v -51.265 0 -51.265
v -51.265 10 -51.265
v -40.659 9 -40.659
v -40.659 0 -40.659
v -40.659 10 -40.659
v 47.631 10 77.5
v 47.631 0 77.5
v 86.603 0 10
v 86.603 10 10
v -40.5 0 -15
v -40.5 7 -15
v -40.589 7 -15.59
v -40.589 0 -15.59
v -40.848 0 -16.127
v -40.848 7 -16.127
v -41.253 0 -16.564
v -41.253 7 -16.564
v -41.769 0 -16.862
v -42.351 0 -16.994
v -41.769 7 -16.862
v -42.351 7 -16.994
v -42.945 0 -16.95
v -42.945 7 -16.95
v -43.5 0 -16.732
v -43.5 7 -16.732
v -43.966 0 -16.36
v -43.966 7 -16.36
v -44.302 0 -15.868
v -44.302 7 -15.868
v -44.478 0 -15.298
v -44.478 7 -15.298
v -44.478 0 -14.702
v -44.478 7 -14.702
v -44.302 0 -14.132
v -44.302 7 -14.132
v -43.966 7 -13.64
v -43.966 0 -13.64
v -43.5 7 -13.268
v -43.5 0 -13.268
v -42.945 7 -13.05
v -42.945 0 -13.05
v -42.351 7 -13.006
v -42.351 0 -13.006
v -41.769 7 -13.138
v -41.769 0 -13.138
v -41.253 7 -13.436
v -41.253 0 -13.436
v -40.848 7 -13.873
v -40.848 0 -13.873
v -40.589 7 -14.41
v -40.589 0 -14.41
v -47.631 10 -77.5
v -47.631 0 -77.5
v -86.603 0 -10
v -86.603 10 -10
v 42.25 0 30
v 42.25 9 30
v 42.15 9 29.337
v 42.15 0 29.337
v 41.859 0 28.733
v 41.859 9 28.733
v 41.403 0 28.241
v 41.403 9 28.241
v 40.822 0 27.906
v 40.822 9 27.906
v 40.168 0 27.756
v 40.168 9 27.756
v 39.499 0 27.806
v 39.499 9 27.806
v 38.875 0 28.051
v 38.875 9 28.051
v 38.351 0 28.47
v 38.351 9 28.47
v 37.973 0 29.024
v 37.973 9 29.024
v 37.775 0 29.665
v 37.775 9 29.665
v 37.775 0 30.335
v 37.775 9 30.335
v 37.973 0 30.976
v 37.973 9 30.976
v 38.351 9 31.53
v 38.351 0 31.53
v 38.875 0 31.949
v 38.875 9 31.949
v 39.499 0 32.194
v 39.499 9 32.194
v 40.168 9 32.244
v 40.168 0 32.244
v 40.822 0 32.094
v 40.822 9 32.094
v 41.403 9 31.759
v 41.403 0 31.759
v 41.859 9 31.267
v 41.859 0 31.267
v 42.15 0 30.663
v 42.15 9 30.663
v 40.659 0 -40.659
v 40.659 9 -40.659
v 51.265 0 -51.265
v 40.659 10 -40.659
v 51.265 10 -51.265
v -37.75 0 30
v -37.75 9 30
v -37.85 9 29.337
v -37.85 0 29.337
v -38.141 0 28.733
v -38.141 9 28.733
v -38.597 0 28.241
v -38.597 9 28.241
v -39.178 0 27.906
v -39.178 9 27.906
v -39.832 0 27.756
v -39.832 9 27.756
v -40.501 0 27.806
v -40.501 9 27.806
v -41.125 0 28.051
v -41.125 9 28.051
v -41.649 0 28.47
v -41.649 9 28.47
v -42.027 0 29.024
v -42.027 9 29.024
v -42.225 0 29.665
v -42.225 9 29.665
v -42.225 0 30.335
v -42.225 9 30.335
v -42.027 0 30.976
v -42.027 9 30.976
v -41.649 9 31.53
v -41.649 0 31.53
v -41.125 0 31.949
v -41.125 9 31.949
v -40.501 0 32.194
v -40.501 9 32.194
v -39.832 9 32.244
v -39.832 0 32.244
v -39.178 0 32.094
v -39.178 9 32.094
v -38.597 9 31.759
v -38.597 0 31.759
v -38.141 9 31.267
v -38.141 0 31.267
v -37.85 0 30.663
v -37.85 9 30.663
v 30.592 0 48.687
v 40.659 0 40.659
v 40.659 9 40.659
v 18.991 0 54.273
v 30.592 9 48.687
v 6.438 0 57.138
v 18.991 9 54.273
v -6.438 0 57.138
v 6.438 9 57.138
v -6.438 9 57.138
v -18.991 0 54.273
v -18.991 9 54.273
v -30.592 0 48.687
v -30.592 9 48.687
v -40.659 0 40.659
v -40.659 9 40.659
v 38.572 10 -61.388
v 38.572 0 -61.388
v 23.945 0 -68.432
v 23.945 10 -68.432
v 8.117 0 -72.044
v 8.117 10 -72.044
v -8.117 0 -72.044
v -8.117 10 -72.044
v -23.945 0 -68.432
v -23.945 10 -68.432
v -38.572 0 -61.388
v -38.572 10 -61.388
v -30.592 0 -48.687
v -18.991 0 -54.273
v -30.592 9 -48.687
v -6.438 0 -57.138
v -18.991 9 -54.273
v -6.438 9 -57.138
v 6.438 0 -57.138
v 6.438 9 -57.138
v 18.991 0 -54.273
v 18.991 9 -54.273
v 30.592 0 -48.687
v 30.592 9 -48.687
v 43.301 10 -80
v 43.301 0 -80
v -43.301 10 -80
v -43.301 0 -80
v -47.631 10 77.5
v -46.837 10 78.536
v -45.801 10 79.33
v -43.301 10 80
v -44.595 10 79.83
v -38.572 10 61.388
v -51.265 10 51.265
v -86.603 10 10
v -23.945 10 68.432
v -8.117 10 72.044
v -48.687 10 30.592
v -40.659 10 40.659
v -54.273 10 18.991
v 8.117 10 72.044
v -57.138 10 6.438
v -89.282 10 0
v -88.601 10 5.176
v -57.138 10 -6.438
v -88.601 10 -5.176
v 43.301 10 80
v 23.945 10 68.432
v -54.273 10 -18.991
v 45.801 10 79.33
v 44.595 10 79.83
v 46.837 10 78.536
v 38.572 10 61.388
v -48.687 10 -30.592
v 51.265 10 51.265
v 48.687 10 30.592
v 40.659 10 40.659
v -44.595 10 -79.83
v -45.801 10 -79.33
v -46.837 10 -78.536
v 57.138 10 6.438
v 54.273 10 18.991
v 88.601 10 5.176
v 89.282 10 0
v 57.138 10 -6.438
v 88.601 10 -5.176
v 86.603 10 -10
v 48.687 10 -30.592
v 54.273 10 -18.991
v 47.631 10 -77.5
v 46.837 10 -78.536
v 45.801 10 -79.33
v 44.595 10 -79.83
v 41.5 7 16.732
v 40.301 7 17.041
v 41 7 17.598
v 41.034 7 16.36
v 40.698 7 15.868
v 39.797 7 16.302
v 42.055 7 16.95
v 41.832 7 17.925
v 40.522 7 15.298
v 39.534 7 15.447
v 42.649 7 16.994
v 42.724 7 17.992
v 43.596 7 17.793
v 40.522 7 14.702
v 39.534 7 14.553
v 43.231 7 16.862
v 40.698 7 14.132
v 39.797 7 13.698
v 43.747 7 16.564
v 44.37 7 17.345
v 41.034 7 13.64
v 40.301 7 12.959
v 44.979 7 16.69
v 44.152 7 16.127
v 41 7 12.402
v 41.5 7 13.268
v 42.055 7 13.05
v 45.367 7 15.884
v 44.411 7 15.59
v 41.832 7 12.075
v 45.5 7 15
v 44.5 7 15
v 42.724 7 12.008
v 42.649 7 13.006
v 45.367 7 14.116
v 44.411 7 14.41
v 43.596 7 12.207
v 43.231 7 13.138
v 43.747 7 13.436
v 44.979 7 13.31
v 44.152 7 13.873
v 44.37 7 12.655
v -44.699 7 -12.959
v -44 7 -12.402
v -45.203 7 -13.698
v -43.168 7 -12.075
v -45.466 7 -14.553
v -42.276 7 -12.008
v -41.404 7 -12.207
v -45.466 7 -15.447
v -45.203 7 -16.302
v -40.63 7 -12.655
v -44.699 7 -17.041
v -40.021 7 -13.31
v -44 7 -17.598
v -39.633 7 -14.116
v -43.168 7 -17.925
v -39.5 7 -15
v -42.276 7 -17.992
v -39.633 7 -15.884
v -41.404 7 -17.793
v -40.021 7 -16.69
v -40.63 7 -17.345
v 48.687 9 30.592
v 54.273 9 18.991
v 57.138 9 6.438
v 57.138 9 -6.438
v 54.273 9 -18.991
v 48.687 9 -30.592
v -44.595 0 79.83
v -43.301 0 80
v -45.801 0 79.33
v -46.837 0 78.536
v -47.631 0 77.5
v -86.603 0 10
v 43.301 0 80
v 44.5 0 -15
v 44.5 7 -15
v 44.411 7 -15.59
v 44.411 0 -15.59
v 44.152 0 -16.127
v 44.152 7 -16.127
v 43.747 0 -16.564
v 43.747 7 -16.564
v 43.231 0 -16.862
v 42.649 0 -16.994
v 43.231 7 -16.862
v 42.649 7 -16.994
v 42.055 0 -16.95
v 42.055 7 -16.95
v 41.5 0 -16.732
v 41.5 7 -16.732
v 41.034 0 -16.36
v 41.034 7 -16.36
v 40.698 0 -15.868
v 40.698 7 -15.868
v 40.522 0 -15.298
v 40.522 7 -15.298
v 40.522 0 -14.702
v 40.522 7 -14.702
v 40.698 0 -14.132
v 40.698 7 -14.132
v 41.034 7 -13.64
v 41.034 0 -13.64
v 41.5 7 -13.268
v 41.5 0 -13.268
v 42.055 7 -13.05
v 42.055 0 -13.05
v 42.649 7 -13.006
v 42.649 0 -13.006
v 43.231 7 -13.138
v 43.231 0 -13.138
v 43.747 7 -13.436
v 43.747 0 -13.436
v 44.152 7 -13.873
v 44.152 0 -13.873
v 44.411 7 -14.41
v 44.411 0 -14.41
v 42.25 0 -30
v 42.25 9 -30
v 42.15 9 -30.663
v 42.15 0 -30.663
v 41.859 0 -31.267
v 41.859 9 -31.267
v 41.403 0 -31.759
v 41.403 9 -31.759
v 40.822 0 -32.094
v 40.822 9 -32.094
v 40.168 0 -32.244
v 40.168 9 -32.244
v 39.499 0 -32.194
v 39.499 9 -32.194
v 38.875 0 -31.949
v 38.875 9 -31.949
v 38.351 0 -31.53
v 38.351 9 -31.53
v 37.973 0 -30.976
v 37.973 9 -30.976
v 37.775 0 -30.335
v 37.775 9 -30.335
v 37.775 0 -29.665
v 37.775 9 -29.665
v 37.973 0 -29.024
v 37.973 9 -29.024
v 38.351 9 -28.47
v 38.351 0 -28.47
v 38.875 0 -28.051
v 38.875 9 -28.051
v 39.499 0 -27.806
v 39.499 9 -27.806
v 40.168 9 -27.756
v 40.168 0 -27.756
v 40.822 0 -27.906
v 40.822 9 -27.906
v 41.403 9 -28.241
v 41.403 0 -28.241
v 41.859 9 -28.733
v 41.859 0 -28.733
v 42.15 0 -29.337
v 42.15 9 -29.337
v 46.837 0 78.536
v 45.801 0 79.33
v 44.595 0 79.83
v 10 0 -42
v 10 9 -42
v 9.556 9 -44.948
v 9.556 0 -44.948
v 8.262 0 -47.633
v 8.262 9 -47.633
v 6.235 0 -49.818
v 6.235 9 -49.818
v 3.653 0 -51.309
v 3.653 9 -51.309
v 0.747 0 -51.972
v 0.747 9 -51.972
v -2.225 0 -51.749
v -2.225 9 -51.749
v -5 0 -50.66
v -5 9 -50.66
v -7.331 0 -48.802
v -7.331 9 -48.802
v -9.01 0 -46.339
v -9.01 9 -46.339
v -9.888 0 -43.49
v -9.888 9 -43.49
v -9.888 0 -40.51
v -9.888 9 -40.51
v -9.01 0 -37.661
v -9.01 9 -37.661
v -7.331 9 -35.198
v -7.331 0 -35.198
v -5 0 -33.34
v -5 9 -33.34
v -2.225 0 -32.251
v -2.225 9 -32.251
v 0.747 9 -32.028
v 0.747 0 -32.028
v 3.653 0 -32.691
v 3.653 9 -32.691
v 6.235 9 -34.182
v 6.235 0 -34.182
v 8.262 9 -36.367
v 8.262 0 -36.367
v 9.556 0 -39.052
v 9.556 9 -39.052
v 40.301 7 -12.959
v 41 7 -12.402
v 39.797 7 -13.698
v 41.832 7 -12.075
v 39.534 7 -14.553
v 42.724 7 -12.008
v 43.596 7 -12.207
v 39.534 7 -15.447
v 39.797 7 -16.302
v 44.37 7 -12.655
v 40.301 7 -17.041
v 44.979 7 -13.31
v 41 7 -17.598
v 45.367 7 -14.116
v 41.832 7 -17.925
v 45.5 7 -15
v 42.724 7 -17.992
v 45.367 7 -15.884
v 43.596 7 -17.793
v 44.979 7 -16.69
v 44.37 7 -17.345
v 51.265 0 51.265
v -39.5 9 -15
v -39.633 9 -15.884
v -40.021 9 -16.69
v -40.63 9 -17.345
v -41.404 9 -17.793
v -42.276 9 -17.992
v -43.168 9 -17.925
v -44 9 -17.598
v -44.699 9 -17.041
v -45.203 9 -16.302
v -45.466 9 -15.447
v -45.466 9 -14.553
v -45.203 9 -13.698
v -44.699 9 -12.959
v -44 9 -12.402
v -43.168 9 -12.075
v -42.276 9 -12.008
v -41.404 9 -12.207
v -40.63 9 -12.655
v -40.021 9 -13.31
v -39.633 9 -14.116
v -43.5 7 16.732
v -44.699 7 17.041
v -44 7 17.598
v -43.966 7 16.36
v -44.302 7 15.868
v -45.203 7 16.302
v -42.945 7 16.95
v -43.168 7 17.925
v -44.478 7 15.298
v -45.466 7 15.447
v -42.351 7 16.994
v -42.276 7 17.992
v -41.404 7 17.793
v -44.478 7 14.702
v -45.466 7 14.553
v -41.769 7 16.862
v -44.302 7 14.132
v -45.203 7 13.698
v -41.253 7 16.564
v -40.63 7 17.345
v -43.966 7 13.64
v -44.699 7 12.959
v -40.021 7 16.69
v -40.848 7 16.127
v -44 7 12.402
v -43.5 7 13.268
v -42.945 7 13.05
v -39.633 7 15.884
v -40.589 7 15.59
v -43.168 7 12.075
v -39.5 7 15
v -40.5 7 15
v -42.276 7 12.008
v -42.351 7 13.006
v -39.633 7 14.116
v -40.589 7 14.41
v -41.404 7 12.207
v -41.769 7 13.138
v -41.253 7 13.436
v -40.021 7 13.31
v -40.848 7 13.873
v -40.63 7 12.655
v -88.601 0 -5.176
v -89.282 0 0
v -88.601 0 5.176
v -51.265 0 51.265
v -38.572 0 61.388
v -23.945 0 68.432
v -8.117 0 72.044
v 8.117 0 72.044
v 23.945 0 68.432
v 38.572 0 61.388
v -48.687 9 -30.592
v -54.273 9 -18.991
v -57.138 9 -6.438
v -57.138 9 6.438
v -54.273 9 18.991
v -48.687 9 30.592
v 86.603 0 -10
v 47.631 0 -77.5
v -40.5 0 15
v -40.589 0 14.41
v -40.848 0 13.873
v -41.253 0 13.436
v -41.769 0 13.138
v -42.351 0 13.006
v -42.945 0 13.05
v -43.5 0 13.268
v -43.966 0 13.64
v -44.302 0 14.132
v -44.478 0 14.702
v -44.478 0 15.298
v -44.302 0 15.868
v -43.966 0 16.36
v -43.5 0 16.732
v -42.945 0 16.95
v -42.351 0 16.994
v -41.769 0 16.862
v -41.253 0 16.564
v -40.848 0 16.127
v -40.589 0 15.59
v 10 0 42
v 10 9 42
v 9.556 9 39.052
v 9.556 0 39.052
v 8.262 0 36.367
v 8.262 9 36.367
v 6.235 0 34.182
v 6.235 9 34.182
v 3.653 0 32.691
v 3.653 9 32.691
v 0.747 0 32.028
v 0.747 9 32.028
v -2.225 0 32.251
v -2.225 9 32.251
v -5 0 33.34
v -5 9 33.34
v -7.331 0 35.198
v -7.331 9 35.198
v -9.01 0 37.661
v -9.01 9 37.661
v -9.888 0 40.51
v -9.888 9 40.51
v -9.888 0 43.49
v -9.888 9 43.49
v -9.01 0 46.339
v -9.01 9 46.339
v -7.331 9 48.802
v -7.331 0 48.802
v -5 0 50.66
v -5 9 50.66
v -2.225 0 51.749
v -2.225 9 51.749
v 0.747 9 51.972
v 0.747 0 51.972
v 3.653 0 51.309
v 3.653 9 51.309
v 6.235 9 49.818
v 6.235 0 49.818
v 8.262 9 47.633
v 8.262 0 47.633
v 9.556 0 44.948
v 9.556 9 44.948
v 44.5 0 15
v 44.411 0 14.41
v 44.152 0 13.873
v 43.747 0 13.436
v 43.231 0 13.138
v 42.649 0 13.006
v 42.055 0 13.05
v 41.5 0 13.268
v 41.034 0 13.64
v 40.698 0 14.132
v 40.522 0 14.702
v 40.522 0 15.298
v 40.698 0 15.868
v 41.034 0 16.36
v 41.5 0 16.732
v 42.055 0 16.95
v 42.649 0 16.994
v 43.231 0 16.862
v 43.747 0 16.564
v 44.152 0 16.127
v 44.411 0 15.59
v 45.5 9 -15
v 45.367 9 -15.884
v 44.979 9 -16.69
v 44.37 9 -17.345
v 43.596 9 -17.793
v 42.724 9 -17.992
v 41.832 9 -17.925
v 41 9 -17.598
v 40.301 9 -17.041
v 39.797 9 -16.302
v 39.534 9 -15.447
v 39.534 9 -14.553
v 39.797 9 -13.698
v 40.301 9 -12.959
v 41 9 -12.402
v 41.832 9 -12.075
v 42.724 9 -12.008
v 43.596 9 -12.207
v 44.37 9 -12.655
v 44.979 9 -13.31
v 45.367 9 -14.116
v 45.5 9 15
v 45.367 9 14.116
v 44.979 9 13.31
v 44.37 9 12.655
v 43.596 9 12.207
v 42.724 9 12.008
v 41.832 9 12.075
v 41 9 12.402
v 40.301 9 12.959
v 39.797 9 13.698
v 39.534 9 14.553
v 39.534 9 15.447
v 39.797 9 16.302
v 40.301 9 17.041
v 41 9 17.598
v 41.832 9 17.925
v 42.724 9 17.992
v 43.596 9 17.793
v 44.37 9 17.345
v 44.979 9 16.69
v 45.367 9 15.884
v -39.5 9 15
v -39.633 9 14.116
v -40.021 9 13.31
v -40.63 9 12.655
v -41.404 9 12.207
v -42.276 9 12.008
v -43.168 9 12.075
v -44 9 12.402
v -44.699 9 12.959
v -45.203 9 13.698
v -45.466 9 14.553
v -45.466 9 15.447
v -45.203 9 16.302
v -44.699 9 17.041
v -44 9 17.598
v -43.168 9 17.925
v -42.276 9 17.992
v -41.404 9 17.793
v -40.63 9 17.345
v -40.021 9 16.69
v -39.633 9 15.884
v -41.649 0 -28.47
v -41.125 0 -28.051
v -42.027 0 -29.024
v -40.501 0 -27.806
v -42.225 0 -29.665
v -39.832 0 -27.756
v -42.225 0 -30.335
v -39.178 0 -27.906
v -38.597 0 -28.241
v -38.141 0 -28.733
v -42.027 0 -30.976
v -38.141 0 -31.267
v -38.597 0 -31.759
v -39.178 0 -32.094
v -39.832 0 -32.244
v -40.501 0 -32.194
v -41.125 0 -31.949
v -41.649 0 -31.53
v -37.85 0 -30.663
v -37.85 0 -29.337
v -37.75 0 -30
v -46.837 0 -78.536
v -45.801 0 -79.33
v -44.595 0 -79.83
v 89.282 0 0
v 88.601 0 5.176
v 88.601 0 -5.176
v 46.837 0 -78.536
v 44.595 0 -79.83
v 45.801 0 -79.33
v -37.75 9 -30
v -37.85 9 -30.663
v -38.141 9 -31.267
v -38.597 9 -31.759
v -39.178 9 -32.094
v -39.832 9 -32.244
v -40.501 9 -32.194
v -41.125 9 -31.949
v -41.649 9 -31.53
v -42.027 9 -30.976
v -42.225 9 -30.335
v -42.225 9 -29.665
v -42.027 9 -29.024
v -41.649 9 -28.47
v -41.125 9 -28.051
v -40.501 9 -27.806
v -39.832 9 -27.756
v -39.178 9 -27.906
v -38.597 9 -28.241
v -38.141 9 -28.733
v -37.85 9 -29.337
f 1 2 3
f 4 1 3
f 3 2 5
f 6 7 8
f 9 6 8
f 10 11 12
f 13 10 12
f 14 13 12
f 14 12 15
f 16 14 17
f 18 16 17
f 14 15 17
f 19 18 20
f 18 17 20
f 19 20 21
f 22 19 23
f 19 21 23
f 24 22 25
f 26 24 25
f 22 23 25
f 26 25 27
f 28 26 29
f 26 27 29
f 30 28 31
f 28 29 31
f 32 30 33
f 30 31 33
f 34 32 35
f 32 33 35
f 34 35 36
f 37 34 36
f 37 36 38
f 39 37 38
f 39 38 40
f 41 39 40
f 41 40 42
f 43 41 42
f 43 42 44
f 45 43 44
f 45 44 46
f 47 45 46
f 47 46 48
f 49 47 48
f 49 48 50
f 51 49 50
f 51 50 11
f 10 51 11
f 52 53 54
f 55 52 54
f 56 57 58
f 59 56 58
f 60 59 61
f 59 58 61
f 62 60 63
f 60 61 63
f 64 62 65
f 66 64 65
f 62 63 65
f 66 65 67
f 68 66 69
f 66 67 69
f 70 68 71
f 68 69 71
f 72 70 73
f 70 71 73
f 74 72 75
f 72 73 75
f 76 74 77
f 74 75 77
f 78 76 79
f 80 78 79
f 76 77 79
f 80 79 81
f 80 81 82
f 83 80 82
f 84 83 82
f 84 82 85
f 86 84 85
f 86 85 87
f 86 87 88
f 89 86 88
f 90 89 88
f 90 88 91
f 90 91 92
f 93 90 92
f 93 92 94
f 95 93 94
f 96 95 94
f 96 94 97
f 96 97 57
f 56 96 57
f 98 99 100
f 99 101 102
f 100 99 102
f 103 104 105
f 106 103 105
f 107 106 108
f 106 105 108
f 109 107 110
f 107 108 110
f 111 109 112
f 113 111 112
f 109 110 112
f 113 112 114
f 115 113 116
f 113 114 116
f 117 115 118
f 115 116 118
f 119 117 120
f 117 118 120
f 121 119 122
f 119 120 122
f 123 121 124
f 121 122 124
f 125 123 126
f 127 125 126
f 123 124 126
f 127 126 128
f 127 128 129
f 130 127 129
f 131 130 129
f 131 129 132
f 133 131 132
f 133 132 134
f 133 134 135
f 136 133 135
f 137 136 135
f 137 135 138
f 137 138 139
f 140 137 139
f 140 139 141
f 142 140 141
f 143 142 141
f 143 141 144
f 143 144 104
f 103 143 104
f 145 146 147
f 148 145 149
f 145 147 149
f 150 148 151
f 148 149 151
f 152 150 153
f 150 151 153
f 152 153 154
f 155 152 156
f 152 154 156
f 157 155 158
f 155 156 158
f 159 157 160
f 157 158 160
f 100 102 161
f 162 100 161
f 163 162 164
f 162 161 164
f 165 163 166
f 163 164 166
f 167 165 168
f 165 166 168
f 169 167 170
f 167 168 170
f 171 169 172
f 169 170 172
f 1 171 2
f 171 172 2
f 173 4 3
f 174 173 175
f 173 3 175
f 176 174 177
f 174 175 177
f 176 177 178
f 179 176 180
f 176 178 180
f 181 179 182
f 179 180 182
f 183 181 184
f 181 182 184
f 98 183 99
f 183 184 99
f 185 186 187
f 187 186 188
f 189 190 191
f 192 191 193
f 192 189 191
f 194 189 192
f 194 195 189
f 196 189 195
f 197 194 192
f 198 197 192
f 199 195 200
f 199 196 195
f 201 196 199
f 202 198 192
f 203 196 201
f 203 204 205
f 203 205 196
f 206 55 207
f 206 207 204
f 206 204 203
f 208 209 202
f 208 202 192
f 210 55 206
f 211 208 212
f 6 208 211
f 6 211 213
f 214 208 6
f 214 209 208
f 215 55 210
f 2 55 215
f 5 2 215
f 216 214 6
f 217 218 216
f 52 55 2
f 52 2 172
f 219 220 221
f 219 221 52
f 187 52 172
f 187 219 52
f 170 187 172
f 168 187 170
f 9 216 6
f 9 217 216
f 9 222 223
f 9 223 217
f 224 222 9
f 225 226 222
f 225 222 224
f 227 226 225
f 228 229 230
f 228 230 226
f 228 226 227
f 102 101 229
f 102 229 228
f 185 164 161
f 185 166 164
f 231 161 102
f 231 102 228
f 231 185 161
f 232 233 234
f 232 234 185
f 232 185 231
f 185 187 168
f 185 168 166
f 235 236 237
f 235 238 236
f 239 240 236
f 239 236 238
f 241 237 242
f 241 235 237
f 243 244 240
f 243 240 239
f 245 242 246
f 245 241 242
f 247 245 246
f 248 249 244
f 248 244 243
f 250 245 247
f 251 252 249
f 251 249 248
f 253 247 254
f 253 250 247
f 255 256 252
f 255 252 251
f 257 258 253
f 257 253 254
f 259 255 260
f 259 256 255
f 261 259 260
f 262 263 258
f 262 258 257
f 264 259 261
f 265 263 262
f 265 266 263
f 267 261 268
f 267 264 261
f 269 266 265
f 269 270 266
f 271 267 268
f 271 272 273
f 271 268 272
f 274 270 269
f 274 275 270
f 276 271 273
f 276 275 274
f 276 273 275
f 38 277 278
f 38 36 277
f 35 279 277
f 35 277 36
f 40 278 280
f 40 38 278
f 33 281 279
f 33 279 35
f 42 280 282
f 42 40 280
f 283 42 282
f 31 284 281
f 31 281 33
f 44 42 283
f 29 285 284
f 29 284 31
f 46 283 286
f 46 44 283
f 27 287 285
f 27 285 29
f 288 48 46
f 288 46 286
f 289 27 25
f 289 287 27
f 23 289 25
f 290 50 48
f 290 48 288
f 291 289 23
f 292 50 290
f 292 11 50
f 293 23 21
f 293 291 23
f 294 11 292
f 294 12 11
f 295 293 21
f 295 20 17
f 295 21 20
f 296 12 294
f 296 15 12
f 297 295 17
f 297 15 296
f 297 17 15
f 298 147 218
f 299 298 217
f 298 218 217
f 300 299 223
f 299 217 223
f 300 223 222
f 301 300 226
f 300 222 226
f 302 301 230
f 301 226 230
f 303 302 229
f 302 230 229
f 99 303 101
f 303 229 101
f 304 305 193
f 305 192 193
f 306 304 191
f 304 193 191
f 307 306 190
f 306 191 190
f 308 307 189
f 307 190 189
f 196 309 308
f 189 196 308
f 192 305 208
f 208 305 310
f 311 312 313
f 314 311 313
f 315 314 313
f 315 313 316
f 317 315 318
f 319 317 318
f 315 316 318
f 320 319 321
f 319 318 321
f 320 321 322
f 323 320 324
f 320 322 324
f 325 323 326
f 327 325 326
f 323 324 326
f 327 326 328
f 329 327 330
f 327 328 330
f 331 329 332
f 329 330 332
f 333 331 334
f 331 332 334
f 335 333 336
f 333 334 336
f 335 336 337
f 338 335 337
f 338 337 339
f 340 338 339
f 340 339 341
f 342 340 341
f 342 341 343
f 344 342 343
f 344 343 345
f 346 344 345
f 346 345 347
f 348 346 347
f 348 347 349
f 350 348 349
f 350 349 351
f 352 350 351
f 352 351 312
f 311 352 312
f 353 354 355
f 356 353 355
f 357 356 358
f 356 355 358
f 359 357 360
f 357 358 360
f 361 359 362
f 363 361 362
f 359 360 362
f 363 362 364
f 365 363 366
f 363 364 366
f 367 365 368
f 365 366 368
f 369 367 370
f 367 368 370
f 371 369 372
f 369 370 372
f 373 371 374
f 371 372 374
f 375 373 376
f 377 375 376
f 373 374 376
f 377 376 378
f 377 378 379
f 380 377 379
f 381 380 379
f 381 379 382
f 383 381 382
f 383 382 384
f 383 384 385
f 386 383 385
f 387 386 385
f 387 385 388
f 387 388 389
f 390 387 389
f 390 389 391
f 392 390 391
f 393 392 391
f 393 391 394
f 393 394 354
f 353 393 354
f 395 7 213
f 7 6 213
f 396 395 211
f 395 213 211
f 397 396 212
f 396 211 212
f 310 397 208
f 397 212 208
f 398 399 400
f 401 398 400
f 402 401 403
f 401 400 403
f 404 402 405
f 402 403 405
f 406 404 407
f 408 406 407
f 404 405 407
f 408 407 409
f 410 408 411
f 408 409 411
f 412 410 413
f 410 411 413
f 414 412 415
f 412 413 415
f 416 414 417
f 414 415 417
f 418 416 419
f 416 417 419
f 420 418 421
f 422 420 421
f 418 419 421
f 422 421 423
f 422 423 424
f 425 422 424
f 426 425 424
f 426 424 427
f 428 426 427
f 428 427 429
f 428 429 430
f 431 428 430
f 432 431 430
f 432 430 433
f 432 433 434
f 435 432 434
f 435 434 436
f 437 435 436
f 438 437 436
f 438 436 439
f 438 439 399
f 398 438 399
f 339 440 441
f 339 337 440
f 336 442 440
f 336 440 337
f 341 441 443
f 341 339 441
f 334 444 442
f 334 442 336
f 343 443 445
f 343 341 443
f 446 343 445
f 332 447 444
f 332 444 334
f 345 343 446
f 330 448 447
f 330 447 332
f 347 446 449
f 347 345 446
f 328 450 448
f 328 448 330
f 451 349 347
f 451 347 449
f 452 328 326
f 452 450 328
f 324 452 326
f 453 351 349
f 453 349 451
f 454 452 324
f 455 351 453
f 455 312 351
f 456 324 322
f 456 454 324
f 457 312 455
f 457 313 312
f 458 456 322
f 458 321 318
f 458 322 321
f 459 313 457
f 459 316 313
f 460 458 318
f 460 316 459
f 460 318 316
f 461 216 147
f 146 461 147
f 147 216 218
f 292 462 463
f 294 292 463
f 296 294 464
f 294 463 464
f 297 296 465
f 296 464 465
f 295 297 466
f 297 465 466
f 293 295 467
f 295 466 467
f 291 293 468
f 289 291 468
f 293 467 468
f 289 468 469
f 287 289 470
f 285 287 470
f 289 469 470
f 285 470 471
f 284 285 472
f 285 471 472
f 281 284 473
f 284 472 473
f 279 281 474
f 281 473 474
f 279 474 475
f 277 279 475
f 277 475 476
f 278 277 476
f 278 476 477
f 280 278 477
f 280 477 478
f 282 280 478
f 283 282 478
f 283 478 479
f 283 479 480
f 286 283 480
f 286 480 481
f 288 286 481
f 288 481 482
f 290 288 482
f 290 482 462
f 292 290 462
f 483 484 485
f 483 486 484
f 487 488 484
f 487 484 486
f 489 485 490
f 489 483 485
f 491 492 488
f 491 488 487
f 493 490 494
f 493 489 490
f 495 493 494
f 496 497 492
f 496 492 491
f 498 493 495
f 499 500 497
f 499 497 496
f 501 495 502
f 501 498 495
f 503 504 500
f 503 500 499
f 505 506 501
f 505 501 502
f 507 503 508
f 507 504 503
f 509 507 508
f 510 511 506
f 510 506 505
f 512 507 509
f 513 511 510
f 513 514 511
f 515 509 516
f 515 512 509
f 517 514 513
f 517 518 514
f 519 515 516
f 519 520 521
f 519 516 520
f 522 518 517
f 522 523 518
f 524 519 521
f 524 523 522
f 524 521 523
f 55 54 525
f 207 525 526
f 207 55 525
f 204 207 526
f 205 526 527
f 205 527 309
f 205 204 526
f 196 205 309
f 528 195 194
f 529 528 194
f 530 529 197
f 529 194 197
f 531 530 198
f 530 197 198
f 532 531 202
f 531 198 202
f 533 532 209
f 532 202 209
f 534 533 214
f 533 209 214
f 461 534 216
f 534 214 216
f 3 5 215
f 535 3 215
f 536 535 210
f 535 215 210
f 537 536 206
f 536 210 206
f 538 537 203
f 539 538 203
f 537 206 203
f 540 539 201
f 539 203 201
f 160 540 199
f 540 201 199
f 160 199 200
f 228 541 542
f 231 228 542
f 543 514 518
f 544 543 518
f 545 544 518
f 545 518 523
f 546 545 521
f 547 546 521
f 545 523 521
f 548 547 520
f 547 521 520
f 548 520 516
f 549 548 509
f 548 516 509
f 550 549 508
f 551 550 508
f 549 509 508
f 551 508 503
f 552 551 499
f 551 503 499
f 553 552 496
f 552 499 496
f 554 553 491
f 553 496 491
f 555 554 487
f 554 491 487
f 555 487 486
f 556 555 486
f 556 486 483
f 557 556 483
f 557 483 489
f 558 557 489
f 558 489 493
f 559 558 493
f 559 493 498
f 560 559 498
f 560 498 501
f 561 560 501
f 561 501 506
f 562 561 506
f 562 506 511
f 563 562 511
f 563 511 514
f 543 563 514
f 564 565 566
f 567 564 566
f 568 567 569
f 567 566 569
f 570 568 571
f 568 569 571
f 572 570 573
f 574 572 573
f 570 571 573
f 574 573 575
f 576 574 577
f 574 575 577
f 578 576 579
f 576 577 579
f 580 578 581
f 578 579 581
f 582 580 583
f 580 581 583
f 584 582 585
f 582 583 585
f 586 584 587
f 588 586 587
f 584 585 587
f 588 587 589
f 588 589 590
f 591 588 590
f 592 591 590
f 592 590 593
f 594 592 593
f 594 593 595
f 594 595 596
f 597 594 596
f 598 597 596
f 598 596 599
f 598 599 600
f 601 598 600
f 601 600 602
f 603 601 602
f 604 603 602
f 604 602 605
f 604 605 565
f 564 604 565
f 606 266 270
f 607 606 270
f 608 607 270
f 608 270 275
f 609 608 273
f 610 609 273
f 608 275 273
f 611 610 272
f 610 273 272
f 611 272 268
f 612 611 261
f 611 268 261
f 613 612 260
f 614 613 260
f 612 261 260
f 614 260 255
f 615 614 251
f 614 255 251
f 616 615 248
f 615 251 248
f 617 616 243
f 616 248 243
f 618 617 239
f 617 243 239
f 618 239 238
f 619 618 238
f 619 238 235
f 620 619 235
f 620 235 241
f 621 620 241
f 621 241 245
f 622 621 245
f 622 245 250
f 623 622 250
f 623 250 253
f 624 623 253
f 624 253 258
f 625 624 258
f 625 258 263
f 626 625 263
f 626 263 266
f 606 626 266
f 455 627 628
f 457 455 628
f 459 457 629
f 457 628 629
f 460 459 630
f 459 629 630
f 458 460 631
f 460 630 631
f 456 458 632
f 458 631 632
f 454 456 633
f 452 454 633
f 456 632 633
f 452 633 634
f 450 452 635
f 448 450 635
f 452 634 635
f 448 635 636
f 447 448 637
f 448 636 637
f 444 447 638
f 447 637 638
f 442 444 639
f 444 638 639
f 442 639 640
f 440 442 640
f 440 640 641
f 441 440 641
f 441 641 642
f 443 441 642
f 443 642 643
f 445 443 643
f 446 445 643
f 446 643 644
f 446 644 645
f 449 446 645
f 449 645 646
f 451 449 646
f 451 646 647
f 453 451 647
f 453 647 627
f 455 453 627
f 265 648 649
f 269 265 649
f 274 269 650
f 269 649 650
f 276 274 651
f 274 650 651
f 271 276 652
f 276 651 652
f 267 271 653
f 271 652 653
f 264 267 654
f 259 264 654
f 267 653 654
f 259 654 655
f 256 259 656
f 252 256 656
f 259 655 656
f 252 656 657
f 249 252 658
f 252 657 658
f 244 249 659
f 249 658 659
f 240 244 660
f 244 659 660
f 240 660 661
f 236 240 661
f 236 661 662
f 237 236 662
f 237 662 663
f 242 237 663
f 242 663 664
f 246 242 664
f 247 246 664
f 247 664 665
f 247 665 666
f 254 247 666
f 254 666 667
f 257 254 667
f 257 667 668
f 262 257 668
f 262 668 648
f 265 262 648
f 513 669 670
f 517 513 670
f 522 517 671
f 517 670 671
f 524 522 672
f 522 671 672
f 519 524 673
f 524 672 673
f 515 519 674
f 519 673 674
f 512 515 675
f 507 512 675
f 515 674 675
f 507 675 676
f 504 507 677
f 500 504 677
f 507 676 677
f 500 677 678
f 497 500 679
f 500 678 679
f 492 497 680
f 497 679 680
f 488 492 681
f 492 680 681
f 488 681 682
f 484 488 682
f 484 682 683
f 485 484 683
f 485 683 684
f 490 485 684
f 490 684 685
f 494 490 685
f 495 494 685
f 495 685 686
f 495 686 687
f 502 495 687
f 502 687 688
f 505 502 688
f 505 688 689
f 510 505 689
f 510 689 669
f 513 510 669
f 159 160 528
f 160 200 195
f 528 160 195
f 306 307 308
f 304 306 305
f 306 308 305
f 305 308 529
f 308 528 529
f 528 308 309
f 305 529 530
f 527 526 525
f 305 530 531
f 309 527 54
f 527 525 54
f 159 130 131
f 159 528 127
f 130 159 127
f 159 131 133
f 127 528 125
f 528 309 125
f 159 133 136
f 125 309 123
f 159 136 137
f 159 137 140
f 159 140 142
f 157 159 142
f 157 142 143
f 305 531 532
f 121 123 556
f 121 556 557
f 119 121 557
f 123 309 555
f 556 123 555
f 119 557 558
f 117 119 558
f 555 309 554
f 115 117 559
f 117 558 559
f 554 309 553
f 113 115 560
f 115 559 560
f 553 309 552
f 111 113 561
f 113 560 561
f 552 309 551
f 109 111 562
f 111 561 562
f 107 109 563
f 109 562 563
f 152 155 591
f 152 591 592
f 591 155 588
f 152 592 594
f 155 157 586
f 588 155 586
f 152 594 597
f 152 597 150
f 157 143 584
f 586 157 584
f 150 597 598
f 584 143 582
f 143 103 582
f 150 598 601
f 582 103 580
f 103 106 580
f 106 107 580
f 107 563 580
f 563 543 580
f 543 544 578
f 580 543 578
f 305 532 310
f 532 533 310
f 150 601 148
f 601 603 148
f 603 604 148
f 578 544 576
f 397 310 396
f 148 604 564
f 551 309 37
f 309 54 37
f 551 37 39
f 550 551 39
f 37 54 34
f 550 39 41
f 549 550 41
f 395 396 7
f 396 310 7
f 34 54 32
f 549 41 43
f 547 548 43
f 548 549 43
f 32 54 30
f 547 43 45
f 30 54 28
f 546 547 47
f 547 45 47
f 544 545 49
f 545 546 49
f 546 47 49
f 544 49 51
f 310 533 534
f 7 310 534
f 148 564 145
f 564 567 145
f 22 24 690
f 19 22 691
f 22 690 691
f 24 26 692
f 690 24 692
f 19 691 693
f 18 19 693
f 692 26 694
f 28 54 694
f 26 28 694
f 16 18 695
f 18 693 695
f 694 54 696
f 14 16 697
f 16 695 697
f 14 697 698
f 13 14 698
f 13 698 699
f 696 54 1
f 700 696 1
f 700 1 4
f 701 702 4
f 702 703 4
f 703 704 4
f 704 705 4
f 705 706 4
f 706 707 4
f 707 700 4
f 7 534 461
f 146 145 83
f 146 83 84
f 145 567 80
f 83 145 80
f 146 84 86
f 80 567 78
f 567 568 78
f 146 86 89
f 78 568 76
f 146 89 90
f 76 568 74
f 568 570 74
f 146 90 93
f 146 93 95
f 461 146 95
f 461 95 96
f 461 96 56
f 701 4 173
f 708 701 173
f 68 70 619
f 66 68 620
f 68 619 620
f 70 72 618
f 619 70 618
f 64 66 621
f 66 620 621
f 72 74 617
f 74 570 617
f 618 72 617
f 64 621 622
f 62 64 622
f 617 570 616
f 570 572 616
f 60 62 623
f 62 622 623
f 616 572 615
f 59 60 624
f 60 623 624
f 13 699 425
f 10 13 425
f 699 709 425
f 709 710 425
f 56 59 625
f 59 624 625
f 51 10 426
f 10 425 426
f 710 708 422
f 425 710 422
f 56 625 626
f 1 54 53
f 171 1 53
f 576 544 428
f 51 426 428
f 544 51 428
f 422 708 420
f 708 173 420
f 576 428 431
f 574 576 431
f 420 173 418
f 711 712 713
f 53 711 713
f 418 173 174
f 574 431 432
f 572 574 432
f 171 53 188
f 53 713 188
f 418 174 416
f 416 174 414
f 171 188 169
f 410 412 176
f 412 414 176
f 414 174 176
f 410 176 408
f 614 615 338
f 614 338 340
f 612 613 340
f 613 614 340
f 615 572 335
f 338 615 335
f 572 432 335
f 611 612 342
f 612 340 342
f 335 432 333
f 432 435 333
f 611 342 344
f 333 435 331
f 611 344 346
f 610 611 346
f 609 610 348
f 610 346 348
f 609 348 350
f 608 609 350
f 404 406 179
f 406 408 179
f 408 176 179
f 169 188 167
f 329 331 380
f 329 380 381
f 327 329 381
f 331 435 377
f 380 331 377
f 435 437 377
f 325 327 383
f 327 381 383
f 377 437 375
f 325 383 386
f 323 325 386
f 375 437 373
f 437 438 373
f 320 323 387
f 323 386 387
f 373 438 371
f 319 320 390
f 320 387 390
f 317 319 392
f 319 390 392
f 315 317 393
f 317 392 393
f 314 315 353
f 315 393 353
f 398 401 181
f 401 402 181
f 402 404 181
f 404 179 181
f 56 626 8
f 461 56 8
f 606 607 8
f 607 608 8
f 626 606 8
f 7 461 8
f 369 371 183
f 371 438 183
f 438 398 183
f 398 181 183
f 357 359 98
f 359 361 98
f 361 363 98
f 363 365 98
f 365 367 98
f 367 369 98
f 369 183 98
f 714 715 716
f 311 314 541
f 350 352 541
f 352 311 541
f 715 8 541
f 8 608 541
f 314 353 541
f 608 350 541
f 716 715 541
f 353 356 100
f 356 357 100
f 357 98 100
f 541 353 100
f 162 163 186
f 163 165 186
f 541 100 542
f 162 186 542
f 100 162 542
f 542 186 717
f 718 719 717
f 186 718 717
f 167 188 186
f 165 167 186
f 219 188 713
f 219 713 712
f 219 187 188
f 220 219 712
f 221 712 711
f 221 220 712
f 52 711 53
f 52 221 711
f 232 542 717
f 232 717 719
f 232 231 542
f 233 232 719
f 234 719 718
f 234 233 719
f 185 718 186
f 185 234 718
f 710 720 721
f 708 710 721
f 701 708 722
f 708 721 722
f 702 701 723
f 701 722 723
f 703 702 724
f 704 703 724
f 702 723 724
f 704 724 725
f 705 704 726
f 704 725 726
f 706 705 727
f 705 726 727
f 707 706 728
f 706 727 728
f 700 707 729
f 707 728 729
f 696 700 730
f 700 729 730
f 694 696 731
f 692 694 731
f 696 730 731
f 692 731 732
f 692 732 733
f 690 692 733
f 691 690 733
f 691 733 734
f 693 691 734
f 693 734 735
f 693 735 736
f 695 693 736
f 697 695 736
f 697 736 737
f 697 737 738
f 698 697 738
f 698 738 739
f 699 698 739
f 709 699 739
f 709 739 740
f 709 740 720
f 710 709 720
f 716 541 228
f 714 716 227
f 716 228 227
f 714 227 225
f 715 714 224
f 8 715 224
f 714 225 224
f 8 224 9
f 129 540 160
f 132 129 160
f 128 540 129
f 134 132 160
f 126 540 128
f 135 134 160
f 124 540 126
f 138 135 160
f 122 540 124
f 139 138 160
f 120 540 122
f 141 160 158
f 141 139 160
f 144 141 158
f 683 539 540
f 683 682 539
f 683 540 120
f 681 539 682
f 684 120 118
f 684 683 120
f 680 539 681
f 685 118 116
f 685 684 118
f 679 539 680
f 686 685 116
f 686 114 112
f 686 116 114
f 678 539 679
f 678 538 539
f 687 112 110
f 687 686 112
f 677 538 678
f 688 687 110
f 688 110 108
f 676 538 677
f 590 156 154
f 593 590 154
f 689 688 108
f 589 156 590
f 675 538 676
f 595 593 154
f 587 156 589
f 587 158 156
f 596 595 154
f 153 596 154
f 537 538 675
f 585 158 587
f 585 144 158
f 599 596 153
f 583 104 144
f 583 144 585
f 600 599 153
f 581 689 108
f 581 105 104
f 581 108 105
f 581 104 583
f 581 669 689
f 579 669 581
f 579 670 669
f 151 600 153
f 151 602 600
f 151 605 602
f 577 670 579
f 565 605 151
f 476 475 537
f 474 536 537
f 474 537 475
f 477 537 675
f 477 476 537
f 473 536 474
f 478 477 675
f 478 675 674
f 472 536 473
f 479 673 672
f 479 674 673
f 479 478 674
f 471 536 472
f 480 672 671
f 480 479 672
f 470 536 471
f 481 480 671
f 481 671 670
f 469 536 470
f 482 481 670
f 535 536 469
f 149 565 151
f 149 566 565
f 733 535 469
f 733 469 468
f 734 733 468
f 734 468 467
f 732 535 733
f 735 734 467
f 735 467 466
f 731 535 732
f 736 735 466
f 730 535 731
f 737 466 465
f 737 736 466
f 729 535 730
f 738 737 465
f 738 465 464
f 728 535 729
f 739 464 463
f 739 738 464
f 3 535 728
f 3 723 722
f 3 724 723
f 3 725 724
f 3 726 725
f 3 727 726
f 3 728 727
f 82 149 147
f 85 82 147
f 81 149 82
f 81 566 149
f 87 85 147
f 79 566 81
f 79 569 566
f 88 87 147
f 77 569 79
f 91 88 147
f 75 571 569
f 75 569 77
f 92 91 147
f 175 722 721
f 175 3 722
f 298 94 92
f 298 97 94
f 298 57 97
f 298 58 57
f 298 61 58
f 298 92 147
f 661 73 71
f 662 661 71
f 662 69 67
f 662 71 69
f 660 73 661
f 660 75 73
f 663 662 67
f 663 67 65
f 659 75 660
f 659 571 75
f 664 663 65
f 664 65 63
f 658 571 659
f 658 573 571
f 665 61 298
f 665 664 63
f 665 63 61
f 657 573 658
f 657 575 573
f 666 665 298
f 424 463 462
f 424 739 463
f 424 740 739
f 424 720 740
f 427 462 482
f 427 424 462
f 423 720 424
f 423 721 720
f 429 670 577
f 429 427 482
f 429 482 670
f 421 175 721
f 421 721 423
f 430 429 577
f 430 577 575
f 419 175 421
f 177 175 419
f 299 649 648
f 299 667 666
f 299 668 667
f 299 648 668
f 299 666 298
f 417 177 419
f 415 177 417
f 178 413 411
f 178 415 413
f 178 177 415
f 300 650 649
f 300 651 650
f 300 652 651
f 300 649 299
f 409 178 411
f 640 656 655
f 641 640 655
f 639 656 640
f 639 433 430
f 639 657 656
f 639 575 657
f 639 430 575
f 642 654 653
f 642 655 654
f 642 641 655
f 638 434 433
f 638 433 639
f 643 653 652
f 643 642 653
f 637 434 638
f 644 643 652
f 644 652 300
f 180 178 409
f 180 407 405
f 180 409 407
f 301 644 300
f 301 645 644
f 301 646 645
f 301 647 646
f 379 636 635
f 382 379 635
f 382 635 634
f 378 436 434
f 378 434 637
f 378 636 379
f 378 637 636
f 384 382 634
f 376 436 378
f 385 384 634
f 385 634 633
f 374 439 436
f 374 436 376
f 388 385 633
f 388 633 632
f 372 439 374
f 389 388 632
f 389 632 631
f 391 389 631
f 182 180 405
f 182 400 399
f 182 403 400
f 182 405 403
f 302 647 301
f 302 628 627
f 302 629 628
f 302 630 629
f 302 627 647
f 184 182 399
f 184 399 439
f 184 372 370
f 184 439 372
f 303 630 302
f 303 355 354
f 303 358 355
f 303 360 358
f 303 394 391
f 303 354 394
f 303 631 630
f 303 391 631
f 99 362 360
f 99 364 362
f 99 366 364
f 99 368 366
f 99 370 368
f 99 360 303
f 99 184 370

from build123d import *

# Parameters (mm, degrees)
BOSS_EXTRUDE1_DEPTH = 10
SKETCH8_R           = 2
CUT_EXTRUDE10_DEPTH = 21
SKETCH10_R          = 3
CUT_EXTRUDE11_DEPTH = 3
SKETCH11_R          = 2.25
CUT_EXTRUDE12_DEPTH = 12
SKETCH20_R          = 2.25
SKETCH20_R_2        = 3
CUT_EXTRUDE20_DEPTH = 1
CUT_EXTRUDE23_DEPTH = 153
SKETCH27_R          = 10
CUT_EXTRUDE24_DEPTH = 153
FILLET8_R           = 20
FILLET9_R           = 5


with BuildPart() as part:
    # Sketch1 → Boss-Extrude1 (new body)
    with BuildSketch(Plane(origin=(0, 0, 0), x_dir=(1, 0, 0), z_dir=(0, 1, 0))):
        Polygon((92.37604307, 0), (46.188021535, 80), (-46.188021535, 80), (-92.37604307, 0), (-46.188021535, -80), (46.188021535, -80), align=None)
    extrude(amount=BOSS_EXTRUDE1_DEPTH)

    # Sketch8 → Cut-Extrude10 (cut)
    with BuildSketch(Plane(origin=(0, 10, 0), x_dir=(1, 0, 0), z_dir=(0, 1, 0))):
        with Locations((-42.5, 15)):
            Circle(SKETCH8_R)
        with Locations((-42.5, -15)):
            Circle(SKETCH8_R)
        with Locations((42.5, 15)):
            Circle(SKETCH8_R)
        with Locations((42.5, -15)):
            Circle(SKETCH8_R)
    extrude(amount=-CUT_EXTRUDE10_DEPTH, mode=Mode.SUBTRACT)

    # Sketch10 → Cut-Extrude11 (cut)
    with BuildSketch(Plane(origin=(0, 10, 0), x_dir=(1, 0, 0), z_dir=(0, 1, 0))):
        with Locations((-42.5, 15)):
            Circle(SKETCH10_R)
        with Locations((-42.5, -15)):
            Circle(SKETCH10_R)
        with Locations((42.5, 15)):
            Circle(SKETCH10_R)
        with Locations((42.5, -15)):
            Circle(SKETCH10_R)
    extrude(amount=-CUT_EXTRUDE11_DEPTH, mode=Mode.SUBTRACT)

    # Sketch11 → Cut-Extrude12 (cut)
    with BuildSketch(Plane(origin=(0, 10, 0), x_dir=(1, 0, 0), z_dir=(0, 1, 0))):
        with Locations((-40, 30)):
            Circle(SKETCH11_R)
        with Locations((-40, -30)):
            Circle(SKETCH11_R)
        with Locations((40, -30)):
            Circle(SKETCH11_R)
        with Locations((40, 30)):
            Circle(SKETCH11_R)
    extrude(amount=-CUT_EXTRUDE12_DEPTH, mode=Mode.SUBTRACT)

    # Sketch20 → Cut-Extrude20 (cut)
    with BuildSketch(Plane(origin=(0, 10, 0), x_dir=(1, 0, 0), z_dir=(0, 1, 0))):
        with BuildLine():
            ThreePointArc((40.658639918, 40.658639918), (0, 57.5), (-40.658639918, 40.658639918))
            ThreePointArc((-40.658639918, 40.658639918), (-57.5, 0), (-40.658639918, -40.658639918))
            ThreePointArc((-40.658639918, -40.658639918), (0, -57.5), (40.658639918, -40.658639918))
            ThreePointArc((40.658639918, -40.658639918), (53.123073119, -22.004297361), (57.5, 0))
            ThreePointArc((57.5, 0), (53.123073119, 22.004297361), (40.658639918, 40.658639918))
        make_face()
        with Locations((-40, -30)):
            Circle(SKETCH20_R, mode=Mode.SUBTRACT)
        with Locations((-42.5, -15)):
            Circle(SKETCH20_R_2, mode=Mode.SUBTRACT)
        with Locations((40, -30)):
            Circle(SKETCH20_R, mode=Mode.SUBTRACT)
        with Locations((42.5, -15)):
            Circle(SKETCH20_R_2, mode=Mode.SUBTRACT)
        with Locations((-42.5, 15)):
            Circle(SKETCH20_R_2, mode=Mode.SUBTRACT)
        with Locations((-40, 30)):
            Circle(SKETCH20_R, mode=Mode.SUBTRACT)
        with Locations((42.5, 15)):
            Circle(SKETCH20_R_2, mode=Mode.SUBTRACT)
        with Locations((40, 30)):
            Circle(SKETCH20_R, mode=Mode.SUBTRACT)
    extrude(amount=-CUT_EXTRUDE20_DEPTH, mode=Mode.SUBTRACT)

    # Sketch20<7> → Cut-Extrude23 (cut)
    with BuildSketch(Plane(origin=(0, 10, 0), x_dir=(1, 0, 0), z_dir=(0, 1, 0))):
        with BuildLine():
            Line((-51.265241636, 51.265241636), (-40.658639918, 40.658639918))
            ThreePointArc((-40.658639918, 40.658639918), (0, 57.5), (40.658639918, 40.658639918))
            Line((40.658639918, 40.658639918), (51.265241636, 51.265241636))
            ThreePointArc((51.265241636, 51.265241636), (0, 72.5), (-51.265241636, 51.265241636))
        make_face()
        with BuildLine():
            ThreePointArc((40.658639918, -40.658639918), (0, -57.5), (-40.658639918, -40.658639918))
            Line((-40.658639918, -40.658639918), (-51.265241636, -51.265241636))
            ThreePointArc((-51.265241636, -51.265241636), (0, -72.5), (51.265241636, -51.265241636))
            Line((51.265241636, -51.265241636), (40.658639918, -40.658639918))
        make_face()
    extrude(amount=-CUT_EXTRUDE23_DEPTH, mode=Mode.SUBTRACT)

    # Sketch27 → Cut-Extrude24 (cut)
    with BuildSketch(Plane(origin=(0, 9, 0), x_dir=(1, 0, 0), z_dir=(0, 1, 0))):
        with Locations((0, -42)):
            Circle(SKETCH27_R)
        with Locations((0, 42)):
            Circle(SKETCH27_R)
    extrude(amount=-CUT_EXTRUDE24_DEPTH, mode=Mode.SUBTRACT)

    # Fillet8
    fillet8_edges = [part.edges().sort_by_distance(p)[0] for p in [
        (-92.37604307, 5, 0),
        (92.37604307, 5, 0),
    ]]
    fillet(fillet8_edges, radius=FILLET8_R)

    # Fillet9
    fillet9_edges = [part.edges().sort_by_distance(p)[0] for p in [
        (-46.188021535, 5, 80),
        (46.188021535, 5, 80),
        (-46.188021535, 5, -80),
        (46.188021535, 5, -80),
    ]]
    fillet(fillet9_edges, radius=FILLET9_R)


solid = part.part
